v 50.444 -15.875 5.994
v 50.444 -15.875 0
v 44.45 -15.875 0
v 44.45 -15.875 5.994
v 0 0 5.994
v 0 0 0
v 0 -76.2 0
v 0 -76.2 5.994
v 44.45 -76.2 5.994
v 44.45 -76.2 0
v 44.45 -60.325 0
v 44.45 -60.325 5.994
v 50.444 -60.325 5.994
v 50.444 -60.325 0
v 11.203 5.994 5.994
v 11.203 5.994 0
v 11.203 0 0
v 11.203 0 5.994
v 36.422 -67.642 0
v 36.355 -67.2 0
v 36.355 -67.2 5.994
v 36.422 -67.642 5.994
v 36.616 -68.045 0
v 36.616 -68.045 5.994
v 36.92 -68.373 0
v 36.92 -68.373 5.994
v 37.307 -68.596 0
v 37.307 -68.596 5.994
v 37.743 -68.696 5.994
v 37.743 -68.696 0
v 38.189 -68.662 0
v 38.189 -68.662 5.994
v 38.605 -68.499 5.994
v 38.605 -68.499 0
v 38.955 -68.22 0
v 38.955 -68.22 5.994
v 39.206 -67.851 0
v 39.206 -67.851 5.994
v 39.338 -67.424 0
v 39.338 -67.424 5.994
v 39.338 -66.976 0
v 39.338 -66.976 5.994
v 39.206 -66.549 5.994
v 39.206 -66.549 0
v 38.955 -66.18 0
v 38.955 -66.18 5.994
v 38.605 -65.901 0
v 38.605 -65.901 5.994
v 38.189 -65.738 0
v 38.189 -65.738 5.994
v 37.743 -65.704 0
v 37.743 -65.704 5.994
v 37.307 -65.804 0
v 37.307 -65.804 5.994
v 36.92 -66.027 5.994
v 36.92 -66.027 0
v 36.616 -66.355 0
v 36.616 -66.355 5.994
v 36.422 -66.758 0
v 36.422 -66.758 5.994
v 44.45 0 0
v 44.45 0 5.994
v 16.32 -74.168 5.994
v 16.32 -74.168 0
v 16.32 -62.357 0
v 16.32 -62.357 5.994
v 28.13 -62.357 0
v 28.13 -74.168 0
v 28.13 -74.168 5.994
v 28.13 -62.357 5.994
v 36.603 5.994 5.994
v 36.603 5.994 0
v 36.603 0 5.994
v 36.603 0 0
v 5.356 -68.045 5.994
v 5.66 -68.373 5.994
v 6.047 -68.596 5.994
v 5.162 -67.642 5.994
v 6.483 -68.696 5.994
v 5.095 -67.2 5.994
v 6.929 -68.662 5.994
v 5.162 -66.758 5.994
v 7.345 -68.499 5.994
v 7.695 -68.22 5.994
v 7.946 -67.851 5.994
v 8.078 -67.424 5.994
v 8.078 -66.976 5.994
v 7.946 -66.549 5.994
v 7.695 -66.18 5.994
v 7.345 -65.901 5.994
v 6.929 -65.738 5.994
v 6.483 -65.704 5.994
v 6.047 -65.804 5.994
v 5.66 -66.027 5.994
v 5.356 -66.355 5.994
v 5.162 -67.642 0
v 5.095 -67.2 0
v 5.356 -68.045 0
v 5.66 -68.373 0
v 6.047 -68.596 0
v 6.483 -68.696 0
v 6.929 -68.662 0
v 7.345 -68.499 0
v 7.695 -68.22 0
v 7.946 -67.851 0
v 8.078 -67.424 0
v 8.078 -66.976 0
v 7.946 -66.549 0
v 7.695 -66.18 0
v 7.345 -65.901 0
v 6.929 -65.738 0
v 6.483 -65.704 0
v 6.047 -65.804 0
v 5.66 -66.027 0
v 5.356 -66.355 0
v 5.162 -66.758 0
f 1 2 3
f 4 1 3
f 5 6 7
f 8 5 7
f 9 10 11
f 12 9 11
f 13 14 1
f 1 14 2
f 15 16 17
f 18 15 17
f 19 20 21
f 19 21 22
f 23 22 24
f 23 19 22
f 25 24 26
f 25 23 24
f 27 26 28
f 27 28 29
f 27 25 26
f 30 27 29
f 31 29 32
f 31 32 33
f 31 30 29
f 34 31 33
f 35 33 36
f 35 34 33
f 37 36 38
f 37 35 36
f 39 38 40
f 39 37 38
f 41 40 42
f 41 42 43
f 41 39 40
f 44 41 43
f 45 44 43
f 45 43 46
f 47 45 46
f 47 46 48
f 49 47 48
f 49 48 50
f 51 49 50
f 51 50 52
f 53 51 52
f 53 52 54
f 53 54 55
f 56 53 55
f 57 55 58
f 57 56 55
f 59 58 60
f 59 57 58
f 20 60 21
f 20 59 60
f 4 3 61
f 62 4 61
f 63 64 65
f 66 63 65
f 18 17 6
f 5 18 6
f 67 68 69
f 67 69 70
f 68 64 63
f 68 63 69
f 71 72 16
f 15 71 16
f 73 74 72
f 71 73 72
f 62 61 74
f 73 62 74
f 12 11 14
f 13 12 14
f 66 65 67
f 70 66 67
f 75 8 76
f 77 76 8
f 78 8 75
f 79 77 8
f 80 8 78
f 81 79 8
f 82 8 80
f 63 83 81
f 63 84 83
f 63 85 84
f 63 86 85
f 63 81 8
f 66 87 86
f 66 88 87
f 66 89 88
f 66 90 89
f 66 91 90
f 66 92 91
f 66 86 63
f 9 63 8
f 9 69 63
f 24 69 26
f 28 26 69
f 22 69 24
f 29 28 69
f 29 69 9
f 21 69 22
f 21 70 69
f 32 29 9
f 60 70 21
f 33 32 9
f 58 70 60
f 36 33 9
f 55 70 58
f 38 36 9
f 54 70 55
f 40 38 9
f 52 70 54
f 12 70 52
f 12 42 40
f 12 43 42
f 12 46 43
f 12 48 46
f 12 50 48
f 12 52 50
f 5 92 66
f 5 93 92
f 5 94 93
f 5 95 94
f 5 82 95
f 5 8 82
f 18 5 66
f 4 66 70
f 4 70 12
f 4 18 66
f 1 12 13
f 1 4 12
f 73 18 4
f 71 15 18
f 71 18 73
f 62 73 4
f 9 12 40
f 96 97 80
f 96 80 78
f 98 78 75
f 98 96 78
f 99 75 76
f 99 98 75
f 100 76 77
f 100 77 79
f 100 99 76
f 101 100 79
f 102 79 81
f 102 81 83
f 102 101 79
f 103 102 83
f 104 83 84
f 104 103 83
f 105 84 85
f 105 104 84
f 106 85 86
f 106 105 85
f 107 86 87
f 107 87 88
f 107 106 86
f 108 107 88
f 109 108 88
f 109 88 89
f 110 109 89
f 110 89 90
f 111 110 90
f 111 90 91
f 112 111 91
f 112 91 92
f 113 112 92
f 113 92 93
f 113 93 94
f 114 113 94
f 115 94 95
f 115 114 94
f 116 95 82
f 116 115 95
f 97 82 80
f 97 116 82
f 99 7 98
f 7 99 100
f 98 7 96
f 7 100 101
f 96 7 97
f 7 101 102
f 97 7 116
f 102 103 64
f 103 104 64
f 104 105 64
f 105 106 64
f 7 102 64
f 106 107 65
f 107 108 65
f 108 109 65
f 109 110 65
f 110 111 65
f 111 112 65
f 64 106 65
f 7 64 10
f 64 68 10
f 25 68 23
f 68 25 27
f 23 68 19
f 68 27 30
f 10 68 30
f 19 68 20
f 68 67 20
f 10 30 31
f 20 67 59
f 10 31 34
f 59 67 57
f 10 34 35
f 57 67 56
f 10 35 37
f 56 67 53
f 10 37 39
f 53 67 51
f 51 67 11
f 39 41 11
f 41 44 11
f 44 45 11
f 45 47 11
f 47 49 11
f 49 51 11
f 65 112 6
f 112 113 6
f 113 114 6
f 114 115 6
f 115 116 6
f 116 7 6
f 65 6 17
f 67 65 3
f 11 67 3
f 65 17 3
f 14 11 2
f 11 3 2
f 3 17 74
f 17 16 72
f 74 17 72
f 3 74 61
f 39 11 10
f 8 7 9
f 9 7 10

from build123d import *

# Parameters (mm, degrees)
SKETCH1_R           = 1.5
SKETCH1_W           = 11.811
SKETCH1_H           = 11.811
BOSS_EXTRUDE1_DEPTH = 5.9944


with BuildPart() as part:
    # Sketch1 → Boss-Extrude1 (new body)
    with BuildSketch(Plane.XY):
        Polygon((44.45, -60.325), (50.4444, -60.325), (50.4444, -15.875), (44.45, -15.875), (44.45, 0), (36.603489481, 0), (36.603489481, 5.9944), (11.203489481, 5.9944), (11.203489481, 0), (0, 0), (0, -76.2), (44.45, -76.2), align=None)
        with Locations(Location((6.595000018, -67.199999966, 0), (0, 0, 180))):
            Circle(SKETCH1_R, mode=Mode.SUBTRACT)
        with Locations(Location((37.854999982, -67.199999966, 0), (0, 0, 180))):
            Circle(SKETCH1_R, mode=Mode.SUBTRACT)
        with Locations((22.225, -68.2625)):
            Rectangle(SKETCH1_W, SKETCH1_H, mode=Mode.SUBTRACT)
    extrude(amount=BOSS_EXTRUDE1_DEPTH)


solid = part.part
